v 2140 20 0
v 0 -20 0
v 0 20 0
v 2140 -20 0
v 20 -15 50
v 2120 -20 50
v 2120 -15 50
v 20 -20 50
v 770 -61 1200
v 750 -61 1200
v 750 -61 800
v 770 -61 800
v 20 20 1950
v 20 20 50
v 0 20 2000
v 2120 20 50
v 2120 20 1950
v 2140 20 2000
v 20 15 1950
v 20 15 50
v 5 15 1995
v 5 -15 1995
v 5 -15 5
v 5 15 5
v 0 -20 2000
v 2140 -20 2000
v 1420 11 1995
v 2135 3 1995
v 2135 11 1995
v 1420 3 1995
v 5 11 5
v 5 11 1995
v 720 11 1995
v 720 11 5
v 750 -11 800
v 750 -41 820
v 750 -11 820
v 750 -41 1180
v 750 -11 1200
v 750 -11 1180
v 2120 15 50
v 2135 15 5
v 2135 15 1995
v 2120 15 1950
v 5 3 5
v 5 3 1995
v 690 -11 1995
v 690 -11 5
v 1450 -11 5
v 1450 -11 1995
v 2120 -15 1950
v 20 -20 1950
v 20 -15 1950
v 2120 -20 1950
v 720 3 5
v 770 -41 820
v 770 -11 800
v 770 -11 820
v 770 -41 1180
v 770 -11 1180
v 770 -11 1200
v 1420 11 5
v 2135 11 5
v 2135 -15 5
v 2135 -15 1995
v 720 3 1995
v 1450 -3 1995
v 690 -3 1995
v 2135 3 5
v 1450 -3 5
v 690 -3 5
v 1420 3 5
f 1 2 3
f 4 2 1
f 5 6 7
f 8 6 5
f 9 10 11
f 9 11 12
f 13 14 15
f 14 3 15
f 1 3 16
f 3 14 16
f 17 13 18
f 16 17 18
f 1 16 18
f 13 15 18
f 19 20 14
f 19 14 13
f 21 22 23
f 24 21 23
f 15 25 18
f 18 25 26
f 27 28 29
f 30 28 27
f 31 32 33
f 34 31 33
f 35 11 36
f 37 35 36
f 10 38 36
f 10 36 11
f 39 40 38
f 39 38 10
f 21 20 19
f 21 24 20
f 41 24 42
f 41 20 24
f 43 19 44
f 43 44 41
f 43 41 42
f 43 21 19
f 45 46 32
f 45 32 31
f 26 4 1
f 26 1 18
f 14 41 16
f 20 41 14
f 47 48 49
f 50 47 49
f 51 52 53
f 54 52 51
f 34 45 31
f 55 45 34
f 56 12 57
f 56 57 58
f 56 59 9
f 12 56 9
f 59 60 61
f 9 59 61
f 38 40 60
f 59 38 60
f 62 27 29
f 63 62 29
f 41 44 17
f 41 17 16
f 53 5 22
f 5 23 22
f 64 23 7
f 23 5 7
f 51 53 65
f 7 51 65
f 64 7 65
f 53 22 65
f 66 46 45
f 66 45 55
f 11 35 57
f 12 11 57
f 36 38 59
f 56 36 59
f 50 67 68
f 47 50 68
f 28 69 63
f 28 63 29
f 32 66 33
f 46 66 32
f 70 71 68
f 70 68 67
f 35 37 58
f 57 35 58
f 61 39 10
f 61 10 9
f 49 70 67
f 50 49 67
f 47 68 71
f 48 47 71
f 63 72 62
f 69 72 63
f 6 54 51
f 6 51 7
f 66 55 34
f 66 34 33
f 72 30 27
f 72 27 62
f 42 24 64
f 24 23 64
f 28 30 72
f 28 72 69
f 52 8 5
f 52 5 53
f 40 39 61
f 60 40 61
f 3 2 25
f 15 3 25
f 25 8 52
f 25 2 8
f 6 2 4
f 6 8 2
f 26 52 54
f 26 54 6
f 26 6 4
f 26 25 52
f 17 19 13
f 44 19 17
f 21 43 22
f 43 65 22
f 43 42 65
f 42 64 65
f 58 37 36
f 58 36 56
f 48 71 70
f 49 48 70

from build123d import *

# Parameters (mm, degrees)
F0_W          = 2140
F0_H          = 2000
F0_W_2        = 700
F0_H_2        = 45
F0_W_3        = 30
F1_DEPTH      = 20
F1_DEPTH_BACK = 20
F2_DEPTH      = 15
F2_DEPTH_BACK = 15
F3_START      = -3
F0_W_4        = 670
F0_H_3        = 1900
F3_DEPTH      = 8
F4_START      = 3
F4_DEPTH      = 8
F5_W          = 20
F5_H          = 20
F6_DEPTH      = 50
F7_START      = 30
F5_H_2        = 360
F7_DEPTH      = 20


with BuildPart() as f1:
    # F0 (on Front) → F1 (new body, two sides)
    with BuildSketch(Plane.XZ) as f1_sk:
        with Locations((1070, 1000)):
            Rectangle(F0_W, F0_H)
        Polygon((5, 5), (5, 1995), (690, 1995), (720, 1995), (1420, 1995), (1450, 1995), (2135, 1995), (2135, 5), (1450, 5), (1420, 5), (720, 5), (690, 5), align=None, mode=Mode.SUBTRACT)
        Polygon((690, 1995), (5, 1995), (5, 5), (690, 5), (690, 50), (20, 50), (20, 1950), (690, 1950), align=None)
        Polygon((2135, 1995), (1450, 1995), (1450, 1950), (2120, 1950), (2120, 50), (1450, 50), (1450, 5), (2135, 5), align=None)
        with Locations((1070, 1972.5)):
            Rectangle(F0_W_2, F0_H_2)
        with Locations((1070, 27.5)):
            Rectangle(F0_W_2, F0_H_2)
        with Locations((705, 1972.5)):
            Rectangle(F0_W_3, F0_H_2)
        with Locations((1435, 1972.5)):
            Rectangle(F0_W_3, F0_H_2)
        with Locations((705, 27.5)):
            Rectangle(F0_W_3, F0_H_2)
        with Locations((1435, 27.5)):
            Rectangle(F0_W_3, F0_H_2)
    extrude(amount=F1_DEPTH)
    extrude(f1_sk.sketch, amount=-F1_DEPTH_BACK)

    # F0 (on Front) → F2 (cut, two sides)
    with BuildSketch(Plane.XZ) as f2_sk:
        Polygon((690, 1995), (5, 1995), (5, 5), (690, 5), (690, 50), (20, 50), (20, 1950), (690, 1950), align=None)
        with Locations((705, 1972.5)):
            Rectangle(F0_W_3, F0_H_2)
        with Locations((1070, 1972.5)):
            Rectangle(F0_W_2, F0_H_2)
        with Locations((1435, 1972.5)):
            Rectangle(F0_W_3, F0_H_2)
        Polygon((2135, 1995), (1450, 1995), (1450, 1950), (2120, 1950), (2120, 50), (1450, 50), (1450, 5), (2135, 5), align=None)
        with Locations((705, 27.5)):
            Rectangle(F0_W_3, F0_H_2)
        with Locations((1070, 27.5)):
            Rectangle(F0_W_2, F0_H_2)
        with Locations((1435, 27.5)):
            Rectangle(F0_W_3, F0_H_2)
    extrude(amount=F2_DEPTH, mode=Mode.SUBTRACT)
    extrude(f2_sk.sketch, amount=-F2_DEPTH_BACK, mode=Mode.SUBTRACT)


with BuildPart() as f3:
    # F0 (on Front) → F3 (new body)
    with BuildSketch(Plane.XZ.offset(F3_START)):
        with Locations((355, 1000)):
            Rectangle(F0_W_4, F0_H_3)
        Polygon((690, 1995), (5, 1995), (5, 5), (690, 5), (690, 50), (20, 50), (20, 1950), (690, 1950), align=None)
        with Locations((705, 1972.5)):
            Rectangle(F0_W_3, F0_H_2)
        with Locations((705, 1000)):
            Rectangle(F0_W_3, F0_H_3)
        with Locations((705, 27.5)):
            Rectangle(F0_W_3, F0_H_2)
    extrude(amount=-F3_DEPTH)


with BuildPart() as f3b:
    # F0 (on Front) → F3, piece 2 (new body)
    with BuildSketch(Plane.XZ.offset(F3_START)):
        with Locations((1785, 1000)):
            Rectangle(F0_W_4, F0_H_3)
        Polygon((2135, 1995), (1450, 1995), (1450, 1950), (2120, 1950), (2120, 50), (1450, 50), (1450, 5), (2135, 5), align=None)
        with Locations((1435, 1972.5)):
            Rectangle(F0_W_3, F0_H_2)
        with Locations((1435, 1000)):
            Rectangle(F0_W_3, F0_H_3)
        with Locations((1435, 27.5)):
            Rectangle(F0_W_3, F0_H_2)
    extrude(amount=-F3_DEPTH)


with BuildPart() as f4:
    # F0 (on Front) → F4 (new body)
    with BuildSketch(Plane.XZ.offset(F4_START)):
        with Locations((1070, 1972.5)):
            Rectangle(F0_W_2, F0_H_2)
        with Locations((1070, 1000)):
            Rectangle(F0_W_2, F0_H_3)
        with Locations((1435, 1972.5)):
            Rectangle(F0_W_3, F0_H_2)
        with Locations((1435, 1000)):
            Rectangle(F0_W_3, F0_H_3)
        with Locations((705, 1972.5)):
            Rectangle(F0_W_3, F0_H_2)
        with Locations((705, 1000)):
            Rectangle(F0_W_3, F0_H_3)
        with Locations((705, 27.5)):
            Rectangle(F0_W_3, F0_H_2)
        with Locations((1070, 27.5)):
            Rectangle(F0_W_2, F0_H_2)
        with Locations((1435, 27.5)):
            Rectangle(F0_W_3, F0_H_2)
    extrude(amount=F4_DEPTH)


with BuildPart() as f6:
    # F5 (on face) → F6 (new body)
    with BuildSketch(Plane.XZ.offset(11)):
        with Locations((760, 1190)):
            Rectangle(F5_W, F5_H)
    extrude(amount=F6_DEPTH)



with BuildPart() as f6b:
    # F5 (on face) → F6, piece 2 (new body)
    with BuildSketch(Plane.XZ.offset(11)):
        with Locations((760, 810)):
            Rectangle(F5_W, F5_H)
    extrude(amount=F6_DEPTH)


with BuildPart() as f6_1:
    add(f6.part)

    add(f6b.part)  # F7 merges F6b
    # F5 (on face) → F7 (join)
    with BuildSketch(Plane.XZ.offset(11).offset(F7_START)):
        with Locations((760, 1000)):
            Rectangle(F5_W, F5_H_2)
    extrude(amount=F7_DEPTH)


solid = Compound([f1.part, f3.part, f3b.part, f4.part, f6_1.part])
